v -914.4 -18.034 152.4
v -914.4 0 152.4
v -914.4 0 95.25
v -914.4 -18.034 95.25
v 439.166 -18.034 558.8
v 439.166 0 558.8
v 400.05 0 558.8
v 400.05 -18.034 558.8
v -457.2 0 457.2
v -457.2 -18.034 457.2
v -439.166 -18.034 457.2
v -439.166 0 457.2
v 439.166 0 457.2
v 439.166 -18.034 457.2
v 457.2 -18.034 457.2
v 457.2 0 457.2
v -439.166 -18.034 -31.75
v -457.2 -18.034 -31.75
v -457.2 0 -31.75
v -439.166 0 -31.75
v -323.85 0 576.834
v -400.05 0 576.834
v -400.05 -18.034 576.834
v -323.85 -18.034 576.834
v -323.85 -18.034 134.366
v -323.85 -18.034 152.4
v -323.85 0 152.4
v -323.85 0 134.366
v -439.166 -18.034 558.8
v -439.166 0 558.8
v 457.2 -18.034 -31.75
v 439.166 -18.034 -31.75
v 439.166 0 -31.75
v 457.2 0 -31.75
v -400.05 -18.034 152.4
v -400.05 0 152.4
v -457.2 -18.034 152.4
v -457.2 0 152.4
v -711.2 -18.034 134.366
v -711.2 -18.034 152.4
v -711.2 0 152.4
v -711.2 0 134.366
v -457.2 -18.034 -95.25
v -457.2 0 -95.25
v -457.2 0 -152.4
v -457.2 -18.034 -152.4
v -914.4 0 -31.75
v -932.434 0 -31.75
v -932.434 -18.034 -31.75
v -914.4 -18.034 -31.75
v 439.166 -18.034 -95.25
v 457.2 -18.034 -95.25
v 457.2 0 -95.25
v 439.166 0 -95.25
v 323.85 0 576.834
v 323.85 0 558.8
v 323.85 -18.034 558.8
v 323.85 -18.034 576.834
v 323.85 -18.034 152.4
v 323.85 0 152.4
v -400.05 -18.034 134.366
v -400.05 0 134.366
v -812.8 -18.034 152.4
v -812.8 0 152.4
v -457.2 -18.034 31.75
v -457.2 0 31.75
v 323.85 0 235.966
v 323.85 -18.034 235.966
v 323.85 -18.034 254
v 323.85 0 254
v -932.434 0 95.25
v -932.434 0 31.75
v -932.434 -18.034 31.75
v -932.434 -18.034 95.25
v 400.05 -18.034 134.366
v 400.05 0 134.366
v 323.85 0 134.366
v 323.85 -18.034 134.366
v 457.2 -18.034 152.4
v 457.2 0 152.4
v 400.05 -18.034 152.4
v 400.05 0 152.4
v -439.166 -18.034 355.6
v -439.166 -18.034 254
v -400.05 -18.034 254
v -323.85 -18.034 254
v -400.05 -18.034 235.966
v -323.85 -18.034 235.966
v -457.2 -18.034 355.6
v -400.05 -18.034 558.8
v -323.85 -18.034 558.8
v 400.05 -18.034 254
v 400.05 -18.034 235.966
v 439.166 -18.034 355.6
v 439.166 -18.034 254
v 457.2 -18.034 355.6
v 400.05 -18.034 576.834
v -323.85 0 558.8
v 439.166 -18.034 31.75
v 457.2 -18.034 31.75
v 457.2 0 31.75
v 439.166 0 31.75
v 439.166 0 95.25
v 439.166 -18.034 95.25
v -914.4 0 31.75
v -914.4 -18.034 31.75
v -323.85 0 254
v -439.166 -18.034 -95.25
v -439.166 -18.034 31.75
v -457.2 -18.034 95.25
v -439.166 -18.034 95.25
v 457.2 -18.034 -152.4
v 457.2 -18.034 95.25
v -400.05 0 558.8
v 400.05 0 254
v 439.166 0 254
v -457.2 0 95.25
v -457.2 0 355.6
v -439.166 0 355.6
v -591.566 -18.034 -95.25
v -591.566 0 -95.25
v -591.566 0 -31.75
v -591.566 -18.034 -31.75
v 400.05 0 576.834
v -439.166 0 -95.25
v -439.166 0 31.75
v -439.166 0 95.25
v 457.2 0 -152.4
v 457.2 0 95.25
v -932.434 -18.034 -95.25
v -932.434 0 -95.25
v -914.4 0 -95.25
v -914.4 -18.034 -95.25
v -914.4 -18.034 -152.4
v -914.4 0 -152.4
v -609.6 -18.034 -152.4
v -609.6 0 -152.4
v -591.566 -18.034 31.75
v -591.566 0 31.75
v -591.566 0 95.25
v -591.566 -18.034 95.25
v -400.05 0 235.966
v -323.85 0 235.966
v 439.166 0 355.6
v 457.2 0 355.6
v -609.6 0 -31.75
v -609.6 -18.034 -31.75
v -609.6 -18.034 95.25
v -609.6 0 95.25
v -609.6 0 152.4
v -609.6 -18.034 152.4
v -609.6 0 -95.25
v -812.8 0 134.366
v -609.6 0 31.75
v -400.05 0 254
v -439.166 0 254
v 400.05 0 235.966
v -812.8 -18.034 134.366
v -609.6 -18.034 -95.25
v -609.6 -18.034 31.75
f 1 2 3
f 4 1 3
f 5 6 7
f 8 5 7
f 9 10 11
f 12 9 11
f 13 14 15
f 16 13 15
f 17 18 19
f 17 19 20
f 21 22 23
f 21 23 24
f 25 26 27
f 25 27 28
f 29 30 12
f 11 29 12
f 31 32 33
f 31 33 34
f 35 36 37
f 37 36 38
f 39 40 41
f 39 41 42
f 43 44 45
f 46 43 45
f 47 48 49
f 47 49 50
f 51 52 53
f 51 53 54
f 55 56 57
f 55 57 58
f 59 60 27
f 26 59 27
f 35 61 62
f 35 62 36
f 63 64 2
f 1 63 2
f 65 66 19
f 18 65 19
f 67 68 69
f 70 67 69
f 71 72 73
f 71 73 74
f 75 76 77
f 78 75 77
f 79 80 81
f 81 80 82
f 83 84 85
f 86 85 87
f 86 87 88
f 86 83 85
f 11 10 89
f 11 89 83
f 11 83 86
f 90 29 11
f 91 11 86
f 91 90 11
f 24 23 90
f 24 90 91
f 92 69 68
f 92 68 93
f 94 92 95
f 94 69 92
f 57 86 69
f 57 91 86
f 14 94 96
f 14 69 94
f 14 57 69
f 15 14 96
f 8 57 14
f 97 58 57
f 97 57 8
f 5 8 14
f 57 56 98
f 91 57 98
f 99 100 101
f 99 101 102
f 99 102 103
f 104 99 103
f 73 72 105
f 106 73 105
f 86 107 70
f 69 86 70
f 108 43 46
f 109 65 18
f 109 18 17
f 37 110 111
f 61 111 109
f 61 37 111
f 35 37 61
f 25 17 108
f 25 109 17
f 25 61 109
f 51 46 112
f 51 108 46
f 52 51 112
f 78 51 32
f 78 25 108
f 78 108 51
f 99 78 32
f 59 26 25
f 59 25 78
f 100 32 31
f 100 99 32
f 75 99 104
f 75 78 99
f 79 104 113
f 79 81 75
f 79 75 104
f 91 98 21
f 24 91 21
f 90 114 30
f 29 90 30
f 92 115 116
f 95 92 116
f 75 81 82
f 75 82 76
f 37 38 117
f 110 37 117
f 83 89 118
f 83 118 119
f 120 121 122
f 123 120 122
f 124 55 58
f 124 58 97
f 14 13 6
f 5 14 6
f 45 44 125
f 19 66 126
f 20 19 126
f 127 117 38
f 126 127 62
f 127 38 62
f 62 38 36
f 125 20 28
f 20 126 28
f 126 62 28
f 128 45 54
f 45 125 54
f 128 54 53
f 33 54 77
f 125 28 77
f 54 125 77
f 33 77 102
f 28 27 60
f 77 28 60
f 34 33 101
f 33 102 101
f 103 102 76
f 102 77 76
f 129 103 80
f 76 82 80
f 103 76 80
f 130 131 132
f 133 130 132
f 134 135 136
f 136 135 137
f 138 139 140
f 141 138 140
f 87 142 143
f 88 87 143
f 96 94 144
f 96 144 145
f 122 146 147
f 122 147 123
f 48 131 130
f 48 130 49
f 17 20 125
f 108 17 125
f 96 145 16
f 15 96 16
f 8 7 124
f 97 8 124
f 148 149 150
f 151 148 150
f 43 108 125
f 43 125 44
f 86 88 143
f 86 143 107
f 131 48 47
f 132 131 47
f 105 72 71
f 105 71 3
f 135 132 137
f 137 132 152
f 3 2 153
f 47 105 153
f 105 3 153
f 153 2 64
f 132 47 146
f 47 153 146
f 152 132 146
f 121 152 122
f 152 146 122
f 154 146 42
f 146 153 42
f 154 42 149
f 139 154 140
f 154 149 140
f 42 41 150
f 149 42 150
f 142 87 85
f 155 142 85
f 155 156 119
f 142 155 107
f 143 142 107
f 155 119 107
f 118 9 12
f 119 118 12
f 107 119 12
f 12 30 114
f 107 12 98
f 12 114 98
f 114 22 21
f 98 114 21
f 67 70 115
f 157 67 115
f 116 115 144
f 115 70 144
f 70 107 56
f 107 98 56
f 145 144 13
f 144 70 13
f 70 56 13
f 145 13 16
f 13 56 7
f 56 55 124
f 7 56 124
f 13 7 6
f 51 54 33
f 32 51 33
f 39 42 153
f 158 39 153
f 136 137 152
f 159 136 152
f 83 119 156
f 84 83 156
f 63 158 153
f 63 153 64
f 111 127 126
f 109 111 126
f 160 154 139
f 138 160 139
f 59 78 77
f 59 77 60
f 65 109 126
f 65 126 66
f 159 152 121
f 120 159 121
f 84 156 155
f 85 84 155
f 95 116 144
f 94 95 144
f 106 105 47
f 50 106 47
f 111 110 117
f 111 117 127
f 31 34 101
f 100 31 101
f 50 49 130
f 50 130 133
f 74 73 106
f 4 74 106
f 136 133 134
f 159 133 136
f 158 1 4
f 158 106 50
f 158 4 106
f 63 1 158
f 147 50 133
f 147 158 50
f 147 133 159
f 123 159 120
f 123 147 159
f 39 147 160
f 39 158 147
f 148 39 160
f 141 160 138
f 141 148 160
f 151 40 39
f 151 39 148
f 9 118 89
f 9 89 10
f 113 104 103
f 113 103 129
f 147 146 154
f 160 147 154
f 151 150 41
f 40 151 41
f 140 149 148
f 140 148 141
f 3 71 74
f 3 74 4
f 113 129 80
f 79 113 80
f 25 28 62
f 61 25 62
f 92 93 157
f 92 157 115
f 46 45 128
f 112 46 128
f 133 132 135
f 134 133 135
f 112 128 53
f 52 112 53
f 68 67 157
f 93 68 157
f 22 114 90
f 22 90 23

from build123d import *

# Parameters (mm, degrees)
F1_W     = 18.034
F1_H     = 63.5
F2_DEPTH = 18.034
F1_W_2   = 76.2
F1_H_2   = 18.034
F1_H_3   = 101.6


# Not quite as in the source:
# - a variable given as a bare number and used for a length is read in inches; the dataset says mm whatever the document's units were


with BuildPart() as f2:
    # F1 (on Front) → F2 (new body)
    with BuildSketch(Plane.XZ):
        Polygon((-609.6, 95.25), (-609.6, 152.4), (-711.2, 152.4), (-711.2, 134.366), (-812.8, 134.366), (-812.8, 152.4), (-914.4, 152.4), (-914.4, 95.25), (-914.4, 31.75), (-914.4, -31.75), (-914.4, -95.25), (-914.4, -152.4), (-609.6, -152.4), (-609.6, -95.25), (-609.6, -31.75), (-609.6, 31.75), align=None)
        with Locations((-923.417, 63.5)):
            Rectangle(F1_W, F1_H)
        with Locations((-923.417, -63.5)):
            Rectangle(F1_W, F1_H)
        with Locations((-600.583, 63.5)):
            Rectangle(F1_W, F1_H)
        with Locations((-600.583, -63.5)):
            Rectangle(F1_W, F1_H)
    extrude(amount=F2_DEPTH)


with BuildPart() as f2b:
    # F1 (on Front) → F2, piece 2 (new body)
    with BuildSketch(Plane.XZ):
        Polygon((-400.05, 152.4), (-457.2, 152.4), (-457.2, 95.25), (-439.166, 95.25), (-439.166, 31.75), (-457.2, 31.75), (-457.2, -31.75), (-439.166, -31.75), (-439.166, -95.25), (-457.2, -95.25), (-457.2, -152.4), (457.2, -152.4), (457.2, -95.25), (439.166, -95.25), (439.166, -31.75), (457.2, -31.75), (457.2, 31.75), (439.166, 31.75), (439.166, 95.25), (457.2, 95.25), (457.2, 152.4), (400.05, 152.4), (400.05, 134.366), (323.85, 134.366), (323.85, 152.4), (-323.85, 152.4), (-323.85, 134.366), (-400.05, 134.366), align=None)
    extrude(amount=F2_DEPTH)


with BuildPart() as f2c:
    # F1 (on Front) → F2, piece 3 (new body)
    with BuildSketch(Plane.XZ):
        Polygon((-439.166, 254), (-400.05, 254), (-323.85, 254), (323.85, 254), (400.05, 254), (439.166, 254), (439.166, 355.6), (439.166, 457.2), (439.166, 558.8), (400.05, 558.8), (323.85, 558.8), (-323.85, 558.8), (-400.05, 558.8), (-439.166, 558.8), (-439.166, 457.2), (-439.166, 355.6), align=None)
        with Locations((-361.95, 567.817)):
            Rectangle(F1_W_2, F1_H_2)
        with Locations((361.95, 567.817)):
            Rectangle(F1_W_2, F1_H_2)
        with Locations((361.95, 244.983)):
            Rectangle(F1_W_2, F1_H_2)
        with Locations((-361.95, 244.983)):
            Rectangle(F1_W_2, F1_H_2)
        with Locations((-448.183, 406.4)):
            Rectangle(F1_W, F1_H_3)
        with Locations((448.183, 406.4)):
            Rectangle(F1_W, F1_H_3)
    extrude(amount=F2_DEPTH)


solid = Compound([f2.part, f2b.part, f2c.part])
